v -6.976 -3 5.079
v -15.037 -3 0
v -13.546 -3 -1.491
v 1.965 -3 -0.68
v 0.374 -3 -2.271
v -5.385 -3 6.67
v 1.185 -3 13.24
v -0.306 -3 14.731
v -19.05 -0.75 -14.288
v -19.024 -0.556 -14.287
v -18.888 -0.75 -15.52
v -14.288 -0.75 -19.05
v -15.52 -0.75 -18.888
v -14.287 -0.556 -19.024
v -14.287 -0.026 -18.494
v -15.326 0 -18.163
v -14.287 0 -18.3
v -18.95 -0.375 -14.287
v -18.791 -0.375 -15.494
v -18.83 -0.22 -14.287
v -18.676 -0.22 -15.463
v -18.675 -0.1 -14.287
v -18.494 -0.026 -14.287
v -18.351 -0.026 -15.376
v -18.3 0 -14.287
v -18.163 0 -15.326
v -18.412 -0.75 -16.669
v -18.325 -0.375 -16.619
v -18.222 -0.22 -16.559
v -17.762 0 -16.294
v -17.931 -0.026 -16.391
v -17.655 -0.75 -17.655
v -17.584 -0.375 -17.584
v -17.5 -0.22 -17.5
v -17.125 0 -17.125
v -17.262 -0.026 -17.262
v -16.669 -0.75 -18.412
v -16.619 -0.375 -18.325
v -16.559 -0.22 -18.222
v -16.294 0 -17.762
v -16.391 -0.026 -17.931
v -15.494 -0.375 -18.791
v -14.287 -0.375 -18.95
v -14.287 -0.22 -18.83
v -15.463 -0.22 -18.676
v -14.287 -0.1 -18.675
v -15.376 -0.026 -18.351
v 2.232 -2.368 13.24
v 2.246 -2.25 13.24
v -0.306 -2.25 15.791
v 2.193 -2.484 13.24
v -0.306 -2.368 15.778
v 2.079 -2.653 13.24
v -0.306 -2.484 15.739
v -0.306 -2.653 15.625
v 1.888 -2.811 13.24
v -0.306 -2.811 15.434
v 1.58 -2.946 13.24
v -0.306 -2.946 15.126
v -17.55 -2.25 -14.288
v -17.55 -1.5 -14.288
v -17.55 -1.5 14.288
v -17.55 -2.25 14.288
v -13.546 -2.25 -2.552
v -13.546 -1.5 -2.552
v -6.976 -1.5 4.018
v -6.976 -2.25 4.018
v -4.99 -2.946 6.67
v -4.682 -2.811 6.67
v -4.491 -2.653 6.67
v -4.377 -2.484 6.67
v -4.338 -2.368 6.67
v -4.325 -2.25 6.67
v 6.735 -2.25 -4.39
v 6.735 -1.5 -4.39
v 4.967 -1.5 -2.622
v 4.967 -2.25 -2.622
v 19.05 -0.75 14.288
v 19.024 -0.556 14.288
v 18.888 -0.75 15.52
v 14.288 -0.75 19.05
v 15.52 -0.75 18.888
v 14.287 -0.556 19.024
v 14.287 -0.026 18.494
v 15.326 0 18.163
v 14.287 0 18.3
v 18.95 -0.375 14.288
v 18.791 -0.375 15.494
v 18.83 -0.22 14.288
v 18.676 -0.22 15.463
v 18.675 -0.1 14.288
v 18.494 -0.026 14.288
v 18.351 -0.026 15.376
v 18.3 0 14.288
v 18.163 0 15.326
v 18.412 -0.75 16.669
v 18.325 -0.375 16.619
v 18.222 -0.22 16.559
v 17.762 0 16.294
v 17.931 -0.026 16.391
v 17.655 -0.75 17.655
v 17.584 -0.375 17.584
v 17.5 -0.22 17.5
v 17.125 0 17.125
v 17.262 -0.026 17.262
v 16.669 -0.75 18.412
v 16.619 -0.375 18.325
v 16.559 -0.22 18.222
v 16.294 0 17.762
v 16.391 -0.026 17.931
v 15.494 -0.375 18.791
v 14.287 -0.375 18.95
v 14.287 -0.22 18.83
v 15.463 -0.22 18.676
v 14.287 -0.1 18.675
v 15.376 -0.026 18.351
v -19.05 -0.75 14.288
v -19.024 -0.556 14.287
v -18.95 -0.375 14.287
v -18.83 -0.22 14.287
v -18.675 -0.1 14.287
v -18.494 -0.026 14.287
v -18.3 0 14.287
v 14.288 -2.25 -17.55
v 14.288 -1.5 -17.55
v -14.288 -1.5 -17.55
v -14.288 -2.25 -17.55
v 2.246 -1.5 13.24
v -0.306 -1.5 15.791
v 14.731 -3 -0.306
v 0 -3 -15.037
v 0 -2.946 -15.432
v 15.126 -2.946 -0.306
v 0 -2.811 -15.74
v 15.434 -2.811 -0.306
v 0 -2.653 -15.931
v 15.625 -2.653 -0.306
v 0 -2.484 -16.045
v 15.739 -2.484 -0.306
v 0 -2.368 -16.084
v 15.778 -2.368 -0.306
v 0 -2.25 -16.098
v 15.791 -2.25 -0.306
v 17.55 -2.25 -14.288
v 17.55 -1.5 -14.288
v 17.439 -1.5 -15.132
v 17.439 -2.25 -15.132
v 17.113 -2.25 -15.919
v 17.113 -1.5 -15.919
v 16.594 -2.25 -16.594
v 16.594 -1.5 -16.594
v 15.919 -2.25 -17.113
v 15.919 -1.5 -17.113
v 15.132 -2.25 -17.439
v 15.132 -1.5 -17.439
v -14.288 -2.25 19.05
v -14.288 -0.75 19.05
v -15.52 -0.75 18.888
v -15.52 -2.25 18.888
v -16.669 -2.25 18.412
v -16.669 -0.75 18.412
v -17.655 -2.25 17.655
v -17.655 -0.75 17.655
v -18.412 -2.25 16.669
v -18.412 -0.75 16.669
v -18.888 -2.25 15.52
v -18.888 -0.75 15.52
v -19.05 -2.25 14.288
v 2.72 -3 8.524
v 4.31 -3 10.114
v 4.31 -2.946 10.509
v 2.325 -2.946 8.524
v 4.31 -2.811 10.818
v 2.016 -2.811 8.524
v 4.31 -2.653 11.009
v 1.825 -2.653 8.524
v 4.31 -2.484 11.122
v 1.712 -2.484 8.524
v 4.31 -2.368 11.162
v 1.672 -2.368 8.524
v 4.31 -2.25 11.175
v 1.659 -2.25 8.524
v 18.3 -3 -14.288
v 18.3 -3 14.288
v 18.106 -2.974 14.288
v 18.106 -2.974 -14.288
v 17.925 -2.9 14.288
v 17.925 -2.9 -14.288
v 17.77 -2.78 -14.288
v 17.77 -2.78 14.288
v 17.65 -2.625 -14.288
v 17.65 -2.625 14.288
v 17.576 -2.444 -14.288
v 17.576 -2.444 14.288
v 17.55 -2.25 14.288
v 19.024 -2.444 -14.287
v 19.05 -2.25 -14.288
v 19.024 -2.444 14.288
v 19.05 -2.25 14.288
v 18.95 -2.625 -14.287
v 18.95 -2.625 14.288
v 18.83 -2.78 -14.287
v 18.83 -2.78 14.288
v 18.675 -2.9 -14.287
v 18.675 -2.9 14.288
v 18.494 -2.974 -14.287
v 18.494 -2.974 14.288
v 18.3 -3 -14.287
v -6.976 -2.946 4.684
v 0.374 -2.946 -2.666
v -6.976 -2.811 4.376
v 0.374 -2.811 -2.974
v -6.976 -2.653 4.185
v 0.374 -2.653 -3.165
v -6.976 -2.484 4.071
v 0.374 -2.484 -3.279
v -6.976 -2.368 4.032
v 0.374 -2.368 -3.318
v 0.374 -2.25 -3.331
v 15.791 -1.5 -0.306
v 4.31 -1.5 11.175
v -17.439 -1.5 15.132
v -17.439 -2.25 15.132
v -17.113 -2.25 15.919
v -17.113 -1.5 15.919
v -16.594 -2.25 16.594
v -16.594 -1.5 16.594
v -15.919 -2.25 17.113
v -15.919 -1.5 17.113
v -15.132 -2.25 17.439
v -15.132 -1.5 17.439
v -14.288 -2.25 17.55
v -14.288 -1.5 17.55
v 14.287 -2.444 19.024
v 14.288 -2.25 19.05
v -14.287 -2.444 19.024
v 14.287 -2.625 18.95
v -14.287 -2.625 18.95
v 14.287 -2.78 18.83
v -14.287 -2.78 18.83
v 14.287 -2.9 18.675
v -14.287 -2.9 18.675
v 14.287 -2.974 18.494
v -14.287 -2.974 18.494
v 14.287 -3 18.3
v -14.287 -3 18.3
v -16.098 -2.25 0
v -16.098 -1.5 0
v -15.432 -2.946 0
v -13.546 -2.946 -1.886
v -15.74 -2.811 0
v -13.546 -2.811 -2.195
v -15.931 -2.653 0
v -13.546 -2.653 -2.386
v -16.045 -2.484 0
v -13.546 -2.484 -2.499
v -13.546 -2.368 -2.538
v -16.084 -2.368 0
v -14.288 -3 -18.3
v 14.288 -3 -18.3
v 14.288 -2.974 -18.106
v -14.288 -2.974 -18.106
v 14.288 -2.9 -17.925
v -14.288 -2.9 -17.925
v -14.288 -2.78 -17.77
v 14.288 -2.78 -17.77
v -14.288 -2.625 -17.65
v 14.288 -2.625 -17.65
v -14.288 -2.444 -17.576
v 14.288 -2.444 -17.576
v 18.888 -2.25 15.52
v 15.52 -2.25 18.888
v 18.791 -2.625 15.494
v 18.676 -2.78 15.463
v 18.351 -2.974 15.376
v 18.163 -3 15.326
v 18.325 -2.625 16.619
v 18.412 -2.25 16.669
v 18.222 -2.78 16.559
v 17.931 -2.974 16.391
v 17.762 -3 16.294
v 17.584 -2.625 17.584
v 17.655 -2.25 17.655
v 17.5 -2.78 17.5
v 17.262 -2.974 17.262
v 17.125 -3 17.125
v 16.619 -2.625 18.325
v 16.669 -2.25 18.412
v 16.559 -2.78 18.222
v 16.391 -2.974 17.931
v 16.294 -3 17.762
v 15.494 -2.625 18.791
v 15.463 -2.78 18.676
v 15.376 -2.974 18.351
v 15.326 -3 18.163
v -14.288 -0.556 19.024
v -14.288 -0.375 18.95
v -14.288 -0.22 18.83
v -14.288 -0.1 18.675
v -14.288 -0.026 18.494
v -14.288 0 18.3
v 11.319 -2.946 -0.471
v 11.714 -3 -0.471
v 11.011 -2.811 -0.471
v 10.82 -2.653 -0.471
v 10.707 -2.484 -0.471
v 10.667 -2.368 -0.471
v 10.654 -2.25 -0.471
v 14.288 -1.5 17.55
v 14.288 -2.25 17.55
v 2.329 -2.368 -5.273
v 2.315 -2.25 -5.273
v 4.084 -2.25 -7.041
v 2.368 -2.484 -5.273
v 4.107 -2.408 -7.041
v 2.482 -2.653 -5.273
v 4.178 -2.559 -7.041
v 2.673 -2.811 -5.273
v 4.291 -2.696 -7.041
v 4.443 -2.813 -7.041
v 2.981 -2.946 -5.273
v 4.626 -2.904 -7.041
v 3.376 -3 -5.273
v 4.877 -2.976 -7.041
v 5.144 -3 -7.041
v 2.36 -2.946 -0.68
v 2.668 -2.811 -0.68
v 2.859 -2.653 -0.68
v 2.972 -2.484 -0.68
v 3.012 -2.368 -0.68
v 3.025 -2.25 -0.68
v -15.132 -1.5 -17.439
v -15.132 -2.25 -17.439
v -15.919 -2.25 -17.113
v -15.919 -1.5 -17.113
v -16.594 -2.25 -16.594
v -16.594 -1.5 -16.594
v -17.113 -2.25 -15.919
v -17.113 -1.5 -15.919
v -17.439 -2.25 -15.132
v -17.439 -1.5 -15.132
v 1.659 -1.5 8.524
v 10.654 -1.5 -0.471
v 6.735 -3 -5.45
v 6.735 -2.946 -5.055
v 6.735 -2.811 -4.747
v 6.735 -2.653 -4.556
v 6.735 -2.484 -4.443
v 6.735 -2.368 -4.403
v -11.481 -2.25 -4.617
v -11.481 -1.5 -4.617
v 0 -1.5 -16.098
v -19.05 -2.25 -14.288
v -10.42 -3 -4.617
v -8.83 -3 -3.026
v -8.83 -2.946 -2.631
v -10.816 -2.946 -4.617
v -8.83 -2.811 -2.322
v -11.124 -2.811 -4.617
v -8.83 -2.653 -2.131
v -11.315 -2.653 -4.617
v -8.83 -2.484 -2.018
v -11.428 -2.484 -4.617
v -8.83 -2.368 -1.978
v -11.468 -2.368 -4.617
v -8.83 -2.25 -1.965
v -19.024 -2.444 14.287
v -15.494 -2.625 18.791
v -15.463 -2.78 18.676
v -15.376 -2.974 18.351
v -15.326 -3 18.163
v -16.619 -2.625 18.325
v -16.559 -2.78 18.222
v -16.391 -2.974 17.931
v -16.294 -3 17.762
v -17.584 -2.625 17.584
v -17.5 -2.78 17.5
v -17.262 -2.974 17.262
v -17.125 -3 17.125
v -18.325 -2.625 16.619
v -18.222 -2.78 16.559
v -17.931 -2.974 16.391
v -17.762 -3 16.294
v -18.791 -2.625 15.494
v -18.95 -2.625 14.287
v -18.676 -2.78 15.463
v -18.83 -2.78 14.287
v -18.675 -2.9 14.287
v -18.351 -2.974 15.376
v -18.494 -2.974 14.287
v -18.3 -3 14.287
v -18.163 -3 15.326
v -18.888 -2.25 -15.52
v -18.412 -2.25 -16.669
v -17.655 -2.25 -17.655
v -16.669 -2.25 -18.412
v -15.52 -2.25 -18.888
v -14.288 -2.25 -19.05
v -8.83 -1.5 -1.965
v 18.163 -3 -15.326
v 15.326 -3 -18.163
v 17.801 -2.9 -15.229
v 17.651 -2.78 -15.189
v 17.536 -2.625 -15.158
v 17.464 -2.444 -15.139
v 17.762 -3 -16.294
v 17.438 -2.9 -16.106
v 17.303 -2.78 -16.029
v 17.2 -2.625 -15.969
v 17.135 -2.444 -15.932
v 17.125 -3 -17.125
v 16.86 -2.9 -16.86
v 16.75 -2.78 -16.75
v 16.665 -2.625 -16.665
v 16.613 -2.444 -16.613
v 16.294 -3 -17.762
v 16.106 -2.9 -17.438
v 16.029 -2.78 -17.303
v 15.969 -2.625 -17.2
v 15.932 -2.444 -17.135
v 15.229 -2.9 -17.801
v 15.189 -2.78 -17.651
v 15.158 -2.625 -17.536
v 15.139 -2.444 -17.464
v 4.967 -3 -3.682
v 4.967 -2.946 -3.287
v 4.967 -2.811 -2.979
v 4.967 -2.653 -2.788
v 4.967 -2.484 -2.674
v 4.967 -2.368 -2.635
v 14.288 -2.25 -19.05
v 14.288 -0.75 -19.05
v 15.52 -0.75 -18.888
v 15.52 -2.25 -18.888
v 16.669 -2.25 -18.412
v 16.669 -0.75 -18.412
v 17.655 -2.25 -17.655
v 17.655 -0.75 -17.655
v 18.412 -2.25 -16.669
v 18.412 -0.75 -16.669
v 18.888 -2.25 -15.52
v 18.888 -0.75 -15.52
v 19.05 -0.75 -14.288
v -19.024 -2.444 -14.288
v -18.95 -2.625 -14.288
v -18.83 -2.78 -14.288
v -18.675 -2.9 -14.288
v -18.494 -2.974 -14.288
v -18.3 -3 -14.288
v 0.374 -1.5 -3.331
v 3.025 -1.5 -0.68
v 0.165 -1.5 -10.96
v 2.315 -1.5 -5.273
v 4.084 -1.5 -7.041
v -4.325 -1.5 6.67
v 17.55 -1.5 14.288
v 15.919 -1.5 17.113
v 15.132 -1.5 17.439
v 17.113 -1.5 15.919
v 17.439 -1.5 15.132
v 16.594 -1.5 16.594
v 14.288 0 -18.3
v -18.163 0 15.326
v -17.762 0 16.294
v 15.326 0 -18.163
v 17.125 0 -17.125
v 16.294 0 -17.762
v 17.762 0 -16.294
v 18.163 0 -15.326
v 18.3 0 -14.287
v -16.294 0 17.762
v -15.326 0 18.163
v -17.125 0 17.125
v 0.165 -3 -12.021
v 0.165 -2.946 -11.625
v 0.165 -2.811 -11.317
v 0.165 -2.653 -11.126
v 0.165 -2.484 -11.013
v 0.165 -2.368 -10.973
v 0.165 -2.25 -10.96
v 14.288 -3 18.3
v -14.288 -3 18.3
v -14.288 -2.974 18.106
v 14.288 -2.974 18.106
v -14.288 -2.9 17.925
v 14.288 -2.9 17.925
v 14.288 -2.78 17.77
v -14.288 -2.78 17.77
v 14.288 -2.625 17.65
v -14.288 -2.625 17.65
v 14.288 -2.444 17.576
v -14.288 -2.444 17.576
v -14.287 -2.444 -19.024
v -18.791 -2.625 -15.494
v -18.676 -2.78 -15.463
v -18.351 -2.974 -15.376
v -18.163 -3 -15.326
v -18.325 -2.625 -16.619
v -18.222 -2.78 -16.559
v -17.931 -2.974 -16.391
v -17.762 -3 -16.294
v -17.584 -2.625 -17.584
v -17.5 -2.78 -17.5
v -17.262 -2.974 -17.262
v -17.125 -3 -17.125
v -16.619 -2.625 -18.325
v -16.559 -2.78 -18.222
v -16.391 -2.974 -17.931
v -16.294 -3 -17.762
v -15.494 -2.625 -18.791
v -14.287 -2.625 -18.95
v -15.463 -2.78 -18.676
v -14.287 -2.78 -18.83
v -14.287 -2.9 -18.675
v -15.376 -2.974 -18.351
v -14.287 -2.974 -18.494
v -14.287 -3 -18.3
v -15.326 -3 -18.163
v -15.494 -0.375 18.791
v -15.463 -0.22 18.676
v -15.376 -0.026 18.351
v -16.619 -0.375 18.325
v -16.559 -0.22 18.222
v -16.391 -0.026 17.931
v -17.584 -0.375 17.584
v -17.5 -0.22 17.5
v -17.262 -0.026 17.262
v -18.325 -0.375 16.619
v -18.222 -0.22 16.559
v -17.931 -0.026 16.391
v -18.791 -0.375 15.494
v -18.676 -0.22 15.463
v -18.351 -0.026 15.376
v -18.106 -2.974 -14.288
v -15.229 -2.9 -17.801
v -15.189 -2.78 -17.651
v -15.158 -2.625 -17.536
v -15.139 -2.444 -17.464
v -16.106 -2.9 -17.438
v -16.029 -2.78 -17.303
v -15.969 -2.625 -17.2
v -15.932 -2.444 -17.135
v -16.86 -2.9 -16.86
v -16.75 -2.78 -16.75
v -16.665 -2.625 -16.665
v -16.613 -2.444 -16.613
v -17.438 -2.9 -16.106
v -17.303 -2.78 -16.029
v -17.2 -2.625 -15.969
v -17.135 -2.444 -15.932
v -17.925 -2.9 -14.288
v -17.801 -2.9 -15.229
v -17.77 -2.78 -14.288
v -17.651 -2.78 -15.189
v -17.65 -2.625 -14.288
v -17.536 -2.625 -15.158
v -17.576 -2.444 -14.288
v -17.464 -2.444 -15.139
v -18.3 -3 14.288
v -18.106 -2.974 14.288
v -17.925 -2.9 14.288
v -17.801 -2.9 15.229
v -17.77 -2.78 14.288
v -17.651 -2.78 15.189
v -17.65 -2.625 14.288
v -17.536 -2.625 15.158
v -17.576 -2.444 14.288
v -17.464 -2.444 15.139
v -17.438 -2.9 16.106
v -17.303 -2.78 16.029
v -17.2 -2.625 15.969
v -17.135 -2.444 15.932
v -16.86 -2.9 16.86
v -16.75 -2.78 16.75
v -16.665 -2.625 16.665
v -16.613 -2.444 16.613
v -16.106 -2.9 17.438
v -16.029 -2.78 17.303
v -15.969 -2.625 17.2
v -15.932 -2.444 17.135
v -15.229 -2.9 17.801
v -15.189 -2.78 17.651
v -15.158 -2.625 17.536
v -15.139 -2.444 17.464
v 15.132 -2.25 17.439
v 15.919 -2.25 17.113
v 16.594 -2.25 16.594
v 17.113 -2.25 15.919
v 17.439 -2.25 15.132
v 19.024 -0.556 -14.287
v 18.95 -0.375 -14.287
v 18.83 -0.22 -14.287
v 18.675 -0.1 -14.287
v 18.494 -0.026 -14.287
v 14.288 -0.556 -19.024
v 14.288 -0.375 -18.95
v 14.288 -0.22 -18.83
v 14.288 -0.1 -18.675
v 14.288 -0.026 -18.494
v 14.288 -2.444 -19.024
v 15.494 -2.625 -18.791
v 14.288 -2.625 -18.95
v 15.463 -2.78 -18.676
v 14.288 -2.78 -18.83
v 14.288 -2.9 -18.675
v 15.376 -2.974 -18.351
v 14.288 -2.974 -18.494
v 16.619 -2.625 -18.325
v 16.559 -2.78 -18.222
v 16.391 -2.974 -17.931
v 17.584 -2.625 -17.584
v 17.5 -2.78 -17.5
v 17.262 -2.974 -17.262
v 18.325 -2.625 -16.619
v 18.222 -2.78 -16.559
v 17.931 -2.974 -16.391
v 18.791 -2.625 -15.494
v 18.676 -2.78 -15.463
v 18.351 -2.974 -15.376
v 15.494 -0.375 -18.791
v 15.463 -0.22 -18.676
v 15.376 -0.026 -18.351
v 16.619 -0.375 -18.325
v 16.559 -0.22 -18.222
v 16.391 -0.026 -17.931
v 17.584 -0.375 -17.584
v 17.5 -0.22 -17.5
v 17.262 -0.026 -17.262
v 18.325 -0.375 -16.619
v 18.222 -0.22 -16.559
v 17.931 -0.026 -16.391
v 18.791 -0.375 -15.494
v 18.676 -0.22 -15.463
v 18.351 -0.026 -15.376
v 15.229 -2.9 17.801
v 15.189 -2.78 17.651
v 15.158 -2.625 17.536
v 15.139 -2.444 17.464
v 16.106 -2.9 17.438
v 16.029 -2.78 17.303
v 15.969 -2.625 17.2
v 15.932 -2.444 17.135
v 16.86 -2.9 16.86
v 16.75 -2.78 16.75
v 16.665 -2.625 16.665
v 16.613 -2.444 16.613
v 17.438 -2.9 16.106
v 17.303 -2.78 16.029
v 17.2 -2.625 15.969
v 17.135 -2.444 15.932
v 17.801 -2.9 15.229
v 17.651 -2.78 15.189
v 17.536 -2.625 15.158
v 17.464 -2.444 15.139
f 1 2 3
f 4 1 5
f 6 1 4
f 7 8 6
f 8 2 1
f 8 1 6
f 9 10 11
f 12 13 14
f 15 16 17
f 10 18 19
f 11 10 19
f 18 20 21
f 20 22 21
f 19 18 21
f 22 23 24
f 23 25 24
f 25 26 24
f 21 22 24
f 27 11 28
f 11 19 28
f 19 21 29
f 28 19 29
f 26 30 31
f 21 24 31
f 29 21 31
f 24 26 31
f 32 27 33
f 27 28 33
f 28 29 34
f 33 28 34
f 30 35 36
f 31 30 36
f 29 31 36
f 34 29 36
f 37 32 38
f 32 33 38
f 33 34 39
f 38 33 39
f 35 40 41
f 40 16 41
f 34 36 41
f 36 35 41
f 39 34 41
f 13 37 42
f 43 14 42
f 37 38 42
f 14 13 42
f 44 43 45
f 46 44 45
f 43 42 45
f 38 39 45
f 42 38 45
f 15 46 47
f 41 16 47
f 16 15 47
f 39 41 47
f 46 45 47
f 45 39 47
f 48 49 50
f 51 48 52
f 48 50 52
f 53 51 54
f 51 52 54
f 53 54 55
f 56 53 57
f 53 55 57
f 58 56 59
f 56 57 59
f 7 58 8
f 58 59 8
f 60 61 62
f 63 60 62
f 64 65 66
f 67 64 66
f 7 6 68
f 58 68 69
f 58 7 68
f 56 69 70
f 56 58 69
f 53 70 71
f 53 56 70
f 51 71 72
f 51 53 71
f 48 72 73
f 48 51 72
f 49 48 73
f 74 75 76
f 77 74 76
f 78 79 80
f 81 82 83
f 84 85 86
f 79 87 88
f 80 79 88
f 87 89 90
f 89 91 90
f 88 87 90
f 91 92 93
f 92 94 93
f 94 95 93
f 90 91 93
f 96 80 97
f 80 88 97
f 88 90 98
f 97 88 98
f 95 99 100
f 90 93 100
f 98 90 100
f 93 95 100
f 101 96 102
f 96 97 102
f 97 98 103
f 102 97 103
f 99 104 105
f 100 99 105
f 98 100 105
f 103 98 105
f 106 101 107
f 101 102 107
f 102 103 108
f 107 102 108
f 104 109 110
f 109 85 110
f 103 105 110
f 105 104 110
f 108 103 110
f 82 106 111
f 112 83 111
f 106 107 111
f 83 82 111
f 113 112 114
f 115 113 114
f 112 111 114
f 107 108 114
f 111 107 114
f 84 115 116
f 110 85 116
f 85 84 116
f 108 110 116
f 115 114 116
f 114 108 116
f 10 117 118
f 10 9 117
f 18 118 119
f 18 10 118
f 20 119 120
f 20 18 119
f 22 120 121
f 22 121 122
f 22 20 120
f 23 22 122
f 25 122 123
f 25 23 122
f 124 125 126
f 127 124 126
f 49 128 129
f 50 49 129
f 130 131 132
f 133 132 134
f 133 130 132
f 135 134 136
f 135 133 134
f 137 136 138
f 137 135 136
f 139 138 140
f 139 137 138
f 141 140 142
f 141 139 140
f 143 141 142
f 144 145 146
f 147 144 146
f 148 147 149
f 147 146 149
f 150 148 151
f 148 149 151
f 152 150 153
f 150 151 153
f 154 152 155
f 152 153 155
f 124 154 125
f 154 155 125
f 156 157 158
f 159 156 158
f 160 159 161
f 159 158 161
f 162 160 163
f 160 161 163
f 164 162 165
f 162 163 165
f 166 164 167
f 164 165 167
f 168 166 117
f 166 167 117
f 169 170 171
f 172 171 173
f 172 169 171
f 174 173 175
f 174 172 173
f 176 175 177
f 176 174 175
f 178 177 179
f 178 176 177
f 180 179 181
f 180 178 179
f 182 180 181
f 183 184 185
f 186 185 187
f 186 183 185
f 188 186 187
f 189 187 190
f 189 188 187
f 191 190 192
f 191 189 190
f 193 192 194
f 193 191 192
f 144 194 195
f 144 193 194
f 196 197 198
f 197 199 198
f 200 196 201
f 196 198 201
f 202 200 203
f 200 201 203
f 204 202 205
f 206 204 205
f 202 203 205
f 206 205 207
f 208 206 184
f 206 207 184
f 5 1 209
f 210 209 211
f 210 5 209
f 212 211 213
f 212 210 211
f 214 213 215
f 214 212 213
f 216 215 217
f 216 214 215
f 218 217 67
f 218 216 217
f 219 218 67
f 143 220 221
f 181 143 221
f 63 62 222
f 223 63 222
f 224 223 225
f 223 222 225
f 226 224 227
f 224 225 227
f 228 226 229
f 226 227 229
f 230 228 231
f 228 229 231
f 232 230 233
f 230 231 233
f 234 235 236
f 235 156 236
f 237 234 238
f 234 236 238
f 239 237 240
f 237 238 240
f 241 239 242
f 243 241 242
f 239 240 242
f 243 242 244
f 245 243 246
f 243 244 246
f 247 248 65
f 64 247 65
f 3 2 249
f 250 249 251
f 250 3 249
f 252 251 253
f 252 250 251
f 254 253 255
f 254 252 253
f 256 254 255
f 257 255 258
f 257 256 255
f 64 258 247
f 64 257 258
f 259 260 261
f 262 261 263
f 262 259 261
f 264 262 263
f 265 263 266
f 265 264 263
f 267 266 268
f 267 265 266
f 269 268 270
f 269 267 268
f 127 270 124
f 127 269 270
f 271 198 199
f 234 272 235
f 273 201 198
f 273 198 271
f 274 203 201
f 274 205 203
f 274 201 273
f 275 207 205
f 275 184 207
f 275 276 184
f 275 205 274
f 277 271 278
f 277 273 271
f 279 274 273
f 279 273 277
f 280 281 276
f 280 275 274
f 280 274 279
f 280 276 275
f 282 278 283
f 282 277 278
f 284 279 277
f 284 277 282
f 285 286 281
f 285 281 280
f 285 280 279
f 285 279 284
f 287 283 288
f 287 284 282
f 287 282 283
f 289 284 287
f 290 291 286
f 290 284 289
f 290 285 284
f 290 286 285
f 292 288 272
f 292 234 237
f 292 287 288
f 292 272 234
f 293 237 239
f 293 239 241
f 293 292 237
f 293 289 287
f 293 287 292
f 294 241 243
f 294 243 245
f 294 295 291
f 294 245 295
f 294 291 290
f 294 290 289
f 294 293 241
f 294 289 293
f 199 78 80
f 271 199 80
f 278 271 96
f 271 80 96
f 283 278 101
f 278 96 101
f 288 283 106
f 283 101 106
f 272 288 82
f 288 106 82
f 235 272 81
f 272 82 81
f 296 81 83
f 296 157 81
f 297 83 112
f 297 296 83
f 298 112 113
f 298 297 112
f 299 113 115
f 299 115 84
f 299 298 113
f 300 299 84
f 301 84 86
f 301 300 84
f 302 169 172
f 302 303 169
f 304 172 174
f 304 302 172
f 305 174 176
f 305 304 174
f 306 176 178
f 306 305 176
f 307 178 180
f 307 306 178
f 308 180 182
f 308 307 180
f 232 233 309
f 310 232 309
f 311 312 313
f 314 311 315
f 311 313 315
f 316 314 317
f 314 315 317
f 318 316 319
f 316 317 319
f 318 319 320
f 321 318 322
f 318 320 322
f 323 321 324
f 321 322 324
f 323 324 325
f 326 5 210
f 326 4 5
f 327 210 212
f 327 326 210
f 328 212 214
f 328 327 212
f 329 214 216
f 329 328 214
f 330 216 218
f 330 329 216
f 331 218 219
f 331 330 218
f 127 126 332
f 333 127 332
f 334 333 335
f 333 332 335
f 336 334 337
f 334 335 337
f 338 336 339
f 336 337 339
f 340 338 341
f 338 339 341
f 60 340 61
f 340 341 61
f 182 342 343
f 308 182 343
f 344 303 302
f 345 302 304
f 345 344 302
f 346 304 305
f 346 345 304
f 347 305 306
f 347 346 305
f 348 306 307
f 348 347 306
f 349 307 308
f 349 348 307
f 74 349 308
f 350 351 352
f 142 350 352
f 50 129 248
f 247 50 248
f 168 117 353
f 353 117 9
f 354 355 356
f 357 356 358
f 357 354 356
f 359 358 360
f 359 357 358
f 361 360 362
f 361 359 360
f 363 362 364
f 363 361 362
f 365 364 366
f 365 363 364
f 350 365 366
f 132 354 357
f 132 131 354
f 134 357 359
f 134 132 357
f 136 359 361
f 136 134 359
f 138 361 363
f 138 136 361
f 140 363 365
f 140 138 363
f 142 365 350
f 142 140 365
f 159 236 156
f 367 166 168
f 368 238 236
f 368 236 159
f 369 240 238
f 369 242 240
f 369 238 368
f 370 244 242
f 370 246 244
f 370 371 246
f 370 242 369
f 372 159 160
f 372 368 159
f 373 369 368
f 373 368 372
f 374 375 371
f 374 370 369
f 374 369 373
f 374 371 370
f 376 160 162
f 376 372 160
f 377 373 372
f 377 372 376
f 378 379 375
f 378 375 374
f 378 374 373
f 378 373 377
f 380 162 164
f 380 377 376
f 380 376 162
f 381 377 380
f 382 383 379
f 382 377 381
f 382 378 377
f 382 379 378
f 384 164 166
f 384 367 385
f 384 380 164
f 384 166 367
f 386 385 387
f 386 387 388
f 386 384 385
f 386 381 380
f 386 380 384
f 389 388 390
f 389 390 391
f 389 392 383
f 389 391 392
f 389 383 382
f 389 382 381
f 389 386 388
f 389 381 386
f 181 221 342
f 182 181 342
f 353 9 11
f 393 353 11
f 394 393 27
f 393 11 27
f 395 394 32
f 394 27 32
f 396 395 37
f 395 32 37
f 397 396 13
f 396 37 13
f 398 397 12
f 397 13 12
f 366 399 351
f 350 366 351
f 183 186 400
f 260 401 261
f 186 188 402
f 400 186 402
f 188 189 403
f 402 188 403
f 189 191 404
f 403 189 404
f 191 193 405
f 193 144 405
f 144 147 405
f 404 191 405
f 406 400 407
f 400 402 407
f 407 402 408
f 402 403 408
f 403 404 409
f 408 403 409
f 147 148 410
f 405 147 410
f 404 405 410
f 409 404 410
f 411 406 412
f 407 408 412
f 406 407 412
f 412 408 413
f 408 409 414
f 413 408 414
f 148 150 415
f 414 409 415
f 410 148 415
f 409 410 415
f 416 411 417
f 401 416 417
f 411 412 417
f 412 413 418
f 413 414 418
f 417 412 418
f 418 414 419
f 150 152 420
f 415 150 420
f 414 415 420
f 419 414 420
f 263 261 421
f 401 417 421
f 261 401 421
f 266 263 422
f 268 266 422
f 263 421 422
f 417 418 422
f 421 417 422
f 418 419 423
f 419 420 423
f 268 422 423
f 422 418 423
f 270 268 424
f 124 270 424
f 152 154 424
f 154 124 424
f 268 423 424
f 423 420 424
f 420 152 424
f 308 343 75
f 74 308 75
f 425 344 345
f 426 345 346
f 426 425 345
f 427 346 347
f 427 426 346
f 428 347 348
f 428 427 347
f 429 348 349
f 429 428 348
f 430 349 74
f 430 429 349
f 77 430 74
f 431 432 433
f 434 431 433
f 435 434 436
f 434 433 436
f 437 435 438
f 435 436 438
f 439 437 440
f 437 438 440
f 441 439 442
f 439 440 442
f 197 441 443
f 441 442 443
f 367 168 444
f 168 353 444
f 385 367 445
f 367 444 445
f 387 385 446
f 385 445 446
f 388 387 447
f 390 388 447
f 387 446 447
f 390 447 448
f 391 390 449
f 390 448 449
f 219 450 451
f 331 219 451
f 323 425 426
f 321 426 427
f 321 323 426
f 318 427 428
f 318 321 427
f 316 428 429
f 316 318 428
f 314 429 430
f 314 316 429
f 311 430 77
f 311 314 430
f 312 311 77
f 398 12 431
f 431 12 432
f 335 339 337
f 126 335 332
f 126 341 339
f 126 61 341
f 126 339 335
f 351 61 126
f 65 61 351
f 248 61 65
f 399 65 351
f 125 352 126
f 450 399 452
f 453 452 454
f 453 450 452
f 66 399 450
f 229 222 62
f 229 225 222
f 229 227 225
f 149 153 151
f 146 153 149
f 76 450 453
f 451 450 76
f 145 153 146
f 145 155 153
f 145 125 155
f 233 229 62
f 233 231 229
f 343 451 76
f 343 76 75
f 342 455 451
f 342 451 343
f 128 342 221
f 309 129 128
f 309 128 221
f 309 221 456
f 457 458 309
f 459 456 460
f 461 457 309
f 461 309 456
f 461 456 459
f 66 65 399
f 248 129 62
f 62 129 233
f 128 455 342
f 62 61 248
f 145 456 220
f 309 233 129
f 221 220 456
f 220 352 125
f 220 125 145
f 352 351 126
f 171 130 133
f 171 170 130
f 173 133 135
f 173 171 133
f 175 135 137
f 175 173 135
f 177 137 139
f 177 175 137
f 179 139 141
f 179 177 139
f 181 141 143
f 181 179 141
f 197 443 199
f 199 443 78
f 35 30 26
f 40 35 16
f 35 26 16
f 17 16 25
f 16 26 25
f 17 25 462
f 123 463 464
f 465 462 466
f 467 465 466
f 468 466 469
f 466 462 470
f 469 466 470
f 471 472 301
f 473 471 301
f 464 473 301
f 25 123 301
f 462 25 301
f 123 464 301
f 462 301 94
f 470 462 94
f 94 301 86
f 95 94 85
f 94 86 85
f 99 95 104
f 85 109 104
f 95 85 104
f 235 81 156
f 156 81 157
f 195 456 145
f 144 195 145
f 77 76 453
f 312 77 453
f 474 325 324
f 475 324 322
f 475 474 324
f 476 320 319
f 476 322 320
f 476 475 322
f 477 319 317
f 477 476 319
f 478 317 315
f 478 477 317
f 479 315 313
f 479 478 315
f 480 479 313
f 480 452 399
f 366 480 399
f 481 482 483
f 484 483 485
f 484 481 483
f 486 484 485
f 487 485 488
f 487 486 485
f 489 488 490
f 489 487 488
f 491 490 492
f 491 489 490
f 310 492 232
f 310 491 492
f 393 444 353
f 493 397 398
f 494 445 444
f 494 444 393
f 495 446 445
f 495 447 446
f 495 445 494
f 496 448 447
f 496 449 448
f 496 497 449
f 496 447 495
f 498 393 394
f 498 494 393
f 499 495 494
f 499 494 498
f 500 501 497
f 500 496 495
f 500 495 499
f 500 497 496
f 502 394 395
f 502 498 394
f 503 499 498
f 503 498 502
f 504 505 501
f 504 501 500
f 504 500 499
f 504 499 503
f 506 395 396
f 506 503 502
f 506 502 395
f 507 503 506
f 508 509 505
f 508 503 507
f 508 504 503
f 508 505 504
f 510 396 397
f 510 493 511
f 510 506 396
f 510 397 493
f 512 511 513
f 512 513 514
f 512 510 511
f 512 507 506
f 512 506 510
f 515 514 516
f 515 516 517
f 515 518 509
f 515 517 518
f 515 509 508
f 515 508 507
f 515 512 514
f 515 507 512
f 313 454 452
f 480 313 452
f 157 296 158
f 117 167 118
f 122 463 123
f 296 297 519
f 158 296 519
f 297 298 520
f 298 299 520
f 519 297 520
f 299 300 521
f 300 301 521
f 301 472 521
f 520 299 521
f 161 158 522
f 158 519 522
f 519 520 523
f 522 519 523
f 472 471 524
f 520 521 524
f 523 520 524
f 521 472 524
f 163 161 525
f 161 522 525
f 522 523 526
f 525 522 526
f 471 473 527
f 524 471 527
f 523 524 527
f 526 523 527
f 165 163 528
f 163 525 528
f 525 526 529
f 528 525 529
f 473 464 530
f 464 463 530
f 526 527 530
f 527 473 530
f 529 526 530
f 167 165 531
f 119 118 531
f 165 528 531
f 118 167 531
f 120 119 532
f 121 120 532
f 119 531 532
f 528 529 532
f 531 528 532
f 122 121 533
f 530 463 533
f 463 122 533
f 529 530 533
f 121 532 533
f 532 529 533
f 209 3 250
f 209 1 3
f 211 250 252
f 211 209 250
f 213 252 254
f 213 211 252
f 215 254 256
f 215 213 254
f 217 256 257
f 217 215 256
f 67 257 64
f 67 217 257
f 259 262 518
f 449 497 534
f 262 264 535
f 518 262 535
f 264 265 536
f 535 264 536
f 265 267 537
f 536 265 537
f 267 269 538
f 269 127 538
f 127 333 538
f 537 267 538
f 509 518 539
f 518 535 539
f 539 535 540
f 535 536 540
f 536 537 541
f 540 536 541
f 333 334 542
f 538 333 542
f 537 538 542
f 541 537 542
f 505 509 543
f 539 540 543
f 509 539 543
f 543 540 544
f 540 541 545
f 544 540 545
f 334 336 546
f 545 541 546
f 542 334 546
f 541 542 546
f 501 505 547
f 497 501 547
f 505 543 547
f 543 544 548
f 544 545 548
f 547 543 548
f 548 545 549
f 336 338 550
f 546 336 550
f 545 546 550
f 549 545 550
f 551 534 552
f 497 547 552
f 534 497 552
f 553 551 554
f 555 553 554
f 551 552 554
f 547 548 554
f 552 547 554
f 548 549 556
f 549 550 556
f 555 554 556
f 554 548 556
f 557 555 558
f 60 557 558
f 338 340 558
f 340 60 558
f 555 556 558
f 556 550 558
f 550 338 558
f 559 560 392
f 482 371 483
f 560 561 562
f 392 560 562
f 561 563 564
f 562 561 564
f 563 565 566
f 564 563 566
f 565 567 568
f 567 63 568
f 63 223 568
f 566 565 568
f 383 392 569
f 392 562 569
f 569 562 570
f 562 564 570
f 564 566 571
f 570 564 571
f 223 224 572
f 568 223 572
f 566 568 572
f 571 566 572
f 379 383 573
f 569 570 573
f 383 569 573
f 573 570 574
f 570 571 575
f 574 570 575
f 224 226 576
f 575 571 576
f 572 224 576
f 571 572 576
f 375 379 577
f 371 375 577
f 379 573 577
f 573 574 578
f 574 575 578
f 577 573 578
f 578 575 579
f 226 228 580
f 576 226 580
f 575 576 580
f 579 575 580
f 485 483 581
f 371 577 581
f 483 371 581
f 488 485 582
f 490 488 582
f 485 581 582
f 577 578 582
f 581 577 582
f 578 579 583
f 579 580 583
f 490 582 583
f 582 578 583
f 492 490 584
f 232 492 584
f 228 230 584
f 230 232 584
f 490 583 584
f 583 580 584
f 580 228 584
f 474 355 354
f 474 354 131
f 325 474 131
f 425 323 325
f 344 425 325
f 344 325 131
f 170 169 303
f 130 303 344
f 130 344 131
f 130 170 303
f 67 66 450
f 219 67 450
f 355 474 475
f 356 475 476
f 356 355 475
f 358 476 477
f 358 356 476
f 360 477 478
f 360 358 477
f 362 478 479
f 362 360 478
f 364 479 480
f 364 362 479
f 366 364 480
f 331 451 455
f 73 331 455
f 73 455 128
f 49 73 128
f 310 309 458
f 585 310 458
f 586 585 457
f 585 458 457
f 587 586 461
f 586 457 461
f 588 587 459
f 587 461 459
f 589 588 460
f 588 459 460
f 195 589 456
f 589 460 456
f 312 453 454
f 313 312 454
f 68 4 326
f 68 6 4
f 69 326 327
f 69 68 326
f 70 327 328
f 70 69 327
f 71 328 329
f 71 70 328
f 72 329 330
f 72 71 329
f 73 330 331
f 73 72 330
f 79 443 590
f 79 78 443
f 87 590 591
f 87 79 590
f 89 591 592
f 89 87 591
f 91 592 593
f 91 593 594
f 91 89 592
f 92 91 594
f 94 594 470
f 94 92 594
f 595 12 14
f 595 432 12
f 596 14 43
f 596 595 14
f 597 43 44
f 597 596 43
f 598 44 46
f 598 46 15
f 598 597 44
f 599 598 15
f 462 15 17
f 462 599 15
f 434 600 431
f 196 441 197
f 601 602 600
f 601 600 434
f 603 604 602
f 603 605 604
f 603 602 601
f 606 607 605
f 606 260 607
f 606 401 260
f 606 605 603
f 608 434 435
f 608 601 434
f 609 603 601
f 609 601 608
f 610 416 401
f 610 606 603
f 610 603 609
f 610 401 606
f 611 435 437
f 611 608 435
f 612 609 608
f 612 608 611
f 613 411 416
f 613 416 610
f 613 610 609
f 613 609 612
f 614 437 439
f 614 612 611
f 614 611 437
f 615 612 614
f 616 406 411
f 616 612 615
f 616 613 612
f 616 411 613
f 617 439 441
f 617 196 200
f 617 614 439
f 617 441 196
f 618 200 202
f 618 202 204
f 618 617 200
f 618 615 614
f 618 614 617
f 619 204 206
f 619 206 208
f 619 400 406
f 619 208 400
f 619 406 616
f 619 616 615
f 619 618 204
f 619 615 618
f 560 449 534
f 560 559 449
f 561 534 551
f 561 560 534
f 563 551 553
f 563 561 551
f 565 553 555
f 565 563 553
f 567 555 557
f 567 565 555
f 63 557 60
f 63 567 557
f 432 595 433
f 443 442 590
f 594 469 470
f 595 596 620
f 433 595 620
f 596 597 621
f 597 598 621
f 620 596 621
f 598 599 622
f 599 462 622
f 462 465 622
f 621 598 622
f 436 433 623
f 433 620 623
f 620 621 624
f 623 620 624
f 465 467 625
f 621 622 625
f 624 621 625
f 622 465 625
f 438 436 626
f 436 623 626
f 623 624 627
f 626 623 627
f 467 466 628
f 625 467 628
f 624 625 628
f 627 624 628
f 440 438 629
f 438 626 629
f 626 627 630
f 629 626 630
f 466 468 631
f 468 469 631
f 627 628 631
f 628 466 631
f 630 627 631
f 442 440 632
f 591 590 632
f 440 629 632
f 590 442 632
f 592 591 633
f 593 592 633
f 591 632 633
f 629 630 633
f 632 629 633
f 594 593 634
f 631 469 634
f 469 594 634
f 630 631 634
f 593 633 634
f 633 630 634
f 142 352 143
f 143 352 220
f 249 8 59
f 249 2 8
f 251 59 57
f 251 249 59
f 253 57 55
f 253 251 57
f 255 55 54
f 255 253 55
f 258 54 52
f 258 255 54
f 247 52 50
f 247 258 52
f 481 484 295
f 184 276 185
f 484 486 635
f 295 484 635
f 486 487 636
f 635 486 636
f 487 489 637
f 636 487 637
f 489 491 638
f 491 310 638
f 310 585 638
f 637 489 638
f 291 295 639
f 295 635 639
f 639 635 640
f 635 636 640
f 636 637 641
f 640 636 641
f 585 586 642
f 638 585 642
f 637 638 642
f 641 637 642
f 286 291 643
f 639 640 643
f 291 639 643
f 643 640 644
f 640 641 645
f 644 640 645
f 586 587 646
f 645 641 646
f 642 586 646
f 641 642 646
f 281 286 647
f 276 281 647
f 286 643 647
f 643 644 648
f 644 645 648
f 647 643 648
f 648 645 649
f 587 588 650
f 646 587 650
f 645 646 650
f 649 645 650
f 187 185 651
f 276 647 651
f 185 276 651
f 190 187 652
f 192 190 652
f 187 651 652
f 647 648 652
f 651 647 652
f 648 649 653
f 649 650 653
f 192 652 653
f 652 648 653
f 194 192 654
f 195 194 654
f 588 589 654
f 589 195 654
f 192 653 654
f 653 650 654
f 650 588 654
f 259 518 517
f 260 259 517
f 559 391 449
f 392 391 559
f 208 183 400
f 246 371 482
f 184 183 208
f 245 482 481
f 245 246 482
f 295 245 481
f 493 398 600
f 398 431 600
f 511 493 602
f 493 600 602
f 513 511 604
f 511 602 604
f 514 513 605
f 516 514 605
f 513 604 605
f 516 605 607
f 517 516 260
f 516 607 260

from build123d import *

# Parameters (mm, degrees)
F1_DEPTH = 1.5
F2_DEPTH = 3
F4_DEPTH = 3
F5_R     = 0.74999
F6_R     = 0.75


# Not quite as in the source:
# - a fillet or chamfer is up to 0.001 mm smaller than in the source, because OpenCascade refuses the exact size


with BuildPart() as f1:
    # F0 (on Front) → F1 (new body)
    with BuildSketch(Plane.XZ):
        with BuildLine():
            ThreePointArc((-19.05, -14.2875), (-17.6550960454, -17.6550960454), (-14.2875, -19.05))
            Line((-14.2875, -19.05), (14.2875, -19.05))
            ThreePointArc((14.2875, -19.05), (17.6550960454, -17.6550960454), (19.05, -14.2875))
            Line((19.05, -14.2875), (19.05, 14.2875))
            ThreePointArc((19.05, 14.2875), (17.6550960454, 17.6550960454), (14.2875, 19.05))
            Line((14.2875, 19.05), (-14.2875, 19.05))
            ThreePointArc((-14.2875, 19.05), (-17.6550960454, 17.6550960454), (-19.05, 14.2875))
            Line((-19.05, 14.2875), (-19.05, -14.2875))
        make_face()
        Polygon((15.791487975, -0.306085875), (0, -16.09757385), (-11.48107305, -4.616510325), (-8.829722625, -1.9651599), (0.16503015, -10.95990315), (4.083738975, -7.0411848), (2.315441775, -5.2728876), (4.9667922, -2.621537175), (6.735098925, -4.389834375), (10.65380775, -0.471116025), (1.6590645, 8.523627225), (4.310414925, 11.17497765), align=None, mode=Mode.SUBTRACT)
        Polygon((-6.975852825, 4.018416525), (-13.5459216, -2.55165225), (-16.09757385, 0), (-0.306085875, 15.791487975), (2.245566375, 13.239835725), (-4.3245024, 6.66976695), (3.025206675, -0.679942125), (0.37385625, -3.331302075), align=None, mode=Mode.SUBTRACT)
    extrude(amount=F1_DEPTH)

    # F0 (on Front) → F2 (join)
    with BuildSketch(Plane.XZ):
        Polygon((-16.09757385, 0), (-13.5459216, -2.55165225), (-6.975852825, 4.018416525), (0.37385625, -3.331302075), (3.025206675, -0.679942125), (-4.3245024, 6.66976695), (2.245566375, 13.239835725), (-0.306085875, 15.791487975), align=None)
        Polygon((-11.48107305, -4.616510325), (0, -16.09757385), (15.791487975, -0.306085875), (4.310414925, 11.17497765), (1.6590645, 8.523627225), (10.65380775, -0.471116025), (6.735098925, -4.389834375), (4.9667922, -2.621537175), (2.315441775, -5.2728876), (4.083738975, -7.0411848), (0.16503015, -10.95990315), (-8.829722625, -1.9651599), align=None)
    extrude(amount=F2_DEPTH)

    # F3 (on face) → F4 (join)
    with BuildSketch(Plane.XZ):
        with BuildLine():
            ThreePointArc((-14.2875, 19.05), (-17.6550960454, 17.6550960454), (-19.05, 14.2875))
            Line((-19.05, 14.2875), (-19.05, -14.2875))
            ThreePointArc((-19.05, -14.2875), (-17.6550960454, -17.6550960454), (-14.2875, -19.05))
            Line((-14.2875, -19.05), (14.2875, -19.05))
            ThreePointArc((14.2875, -19.05), (17.6550960454, -17.6550960454), (19.05, -14.2875))
            Line((19.05, -14.2875), (19.05, 14.2875))
            ThreePointArc((19.05, 14.2875), (17.6550960454, 17.6550960454), (14.2875, 19.05))
            Line((14.2875, 19.05), (-14.2875, 19.05))
        make_face()
        with BuildLine():
            ThreePointArc((-17.55, 14.2875), (-16.5944358736, 16.5944358736), (-14.2875, 17.55))
            Line((-14.2875, 17.55), (14.2875, 17.55))
            ThreePointArc((14.2875, 17.55), (16.5944358736, 16.5944358736), (17.55, 14.2875))
            Line((17.55, 14.2875), (17.55, -14.2875))
            ThreePointArc((17.55, -14.2875), (16.5944358736, -16.5944358736), (14.2875, -17.55))
            Line((14.2875, -17.55), (-14.2875, -17.55))
            ThreePointArc((-14.2875, -17.55), (-16.5944358736, -16.5944358736), (-17.55, -14.2875))
            Line((-17.55, -14.2875), (-17.55, 14.2875))
        make_face(mode=Mode.SUBTRACT)
    extrude(amount=F4_DEPTH)

    # F5 (radius 0.75 in the source; OpenCascade refuses exactly that, so slightly less here)
    f5_edges = [f1.edges().sort_by_distance(p)[0] for p in [
        (-4.332346, -3, -6.462532),
        (-10.155398, -3, -3.290835),
        (-5.740537, -3, -10.357042),
        (7.895744, -3, -8.20183),
        (10.050951, -3, 5.434446),
        (2.98474, -3, 9.849302),
        (6.156436, -3, 4.026256),
        (8.694453, -3, -2.430475),
        (5.850946, -3, -3.505686),
        (3.641117, -3, -3.947212),
        (3.19959, -3, -6.157036),
        (2.124385, -3, -9.000544),
        (-8.20183, -3, 7.895744),
        (-14.821748, -3, -1.275826),
        (-10.260887, -3, 0.733382),
        (-3.300998, -3, 0.343557),
        (1.699531, -3, -2.005622),
        (-0.649648, -3, 2.994912),
        (-1.039468, -3, 9.954801),
        (0.96974, -3, 14.515662),
        (-17.655096, -3, 17.655096),
        (-19.05, -3, 0),
        (-17.655096, -3, -17.655096),
        (0, -3, -19.05),
        (17.655096, -3, -17.655096),
        (19.05, -3, 0),
        (17.655096, -3, 17.655096),
        (0, -3, 19.05),
        (-16.594436, -3, 16.594436),
        (0, -3, 17.55),
        (16.594436, -3, 16.594436),
        (17.55, -3, 0),
        (16.594436, -3, -16.594436),
        (0, -3, -17.55),
        (-16.594436, -3, -16.594436),
        (-17.55, -3, 0),
    ]]
    fillet(f5_edges, radius=F5_R)

    # F6
    f6_edges = [f1.edges().sort_by_distance(p)[0] for p in [
        (-17.655096, 0, -17.655096),
        (0, 0, -19.05),
        (17.655096, 0, -17.655096),
        (19.05, 0, 0),
        (17.655096, 0, 17.655096),
        (0, 0, 19.05),
        (-17.655096, 0, 17.655096),
        (-19.05, 0, 0),
    ]]
    fillet(f6_edges, radius=F6_R)


solid = f1.part
